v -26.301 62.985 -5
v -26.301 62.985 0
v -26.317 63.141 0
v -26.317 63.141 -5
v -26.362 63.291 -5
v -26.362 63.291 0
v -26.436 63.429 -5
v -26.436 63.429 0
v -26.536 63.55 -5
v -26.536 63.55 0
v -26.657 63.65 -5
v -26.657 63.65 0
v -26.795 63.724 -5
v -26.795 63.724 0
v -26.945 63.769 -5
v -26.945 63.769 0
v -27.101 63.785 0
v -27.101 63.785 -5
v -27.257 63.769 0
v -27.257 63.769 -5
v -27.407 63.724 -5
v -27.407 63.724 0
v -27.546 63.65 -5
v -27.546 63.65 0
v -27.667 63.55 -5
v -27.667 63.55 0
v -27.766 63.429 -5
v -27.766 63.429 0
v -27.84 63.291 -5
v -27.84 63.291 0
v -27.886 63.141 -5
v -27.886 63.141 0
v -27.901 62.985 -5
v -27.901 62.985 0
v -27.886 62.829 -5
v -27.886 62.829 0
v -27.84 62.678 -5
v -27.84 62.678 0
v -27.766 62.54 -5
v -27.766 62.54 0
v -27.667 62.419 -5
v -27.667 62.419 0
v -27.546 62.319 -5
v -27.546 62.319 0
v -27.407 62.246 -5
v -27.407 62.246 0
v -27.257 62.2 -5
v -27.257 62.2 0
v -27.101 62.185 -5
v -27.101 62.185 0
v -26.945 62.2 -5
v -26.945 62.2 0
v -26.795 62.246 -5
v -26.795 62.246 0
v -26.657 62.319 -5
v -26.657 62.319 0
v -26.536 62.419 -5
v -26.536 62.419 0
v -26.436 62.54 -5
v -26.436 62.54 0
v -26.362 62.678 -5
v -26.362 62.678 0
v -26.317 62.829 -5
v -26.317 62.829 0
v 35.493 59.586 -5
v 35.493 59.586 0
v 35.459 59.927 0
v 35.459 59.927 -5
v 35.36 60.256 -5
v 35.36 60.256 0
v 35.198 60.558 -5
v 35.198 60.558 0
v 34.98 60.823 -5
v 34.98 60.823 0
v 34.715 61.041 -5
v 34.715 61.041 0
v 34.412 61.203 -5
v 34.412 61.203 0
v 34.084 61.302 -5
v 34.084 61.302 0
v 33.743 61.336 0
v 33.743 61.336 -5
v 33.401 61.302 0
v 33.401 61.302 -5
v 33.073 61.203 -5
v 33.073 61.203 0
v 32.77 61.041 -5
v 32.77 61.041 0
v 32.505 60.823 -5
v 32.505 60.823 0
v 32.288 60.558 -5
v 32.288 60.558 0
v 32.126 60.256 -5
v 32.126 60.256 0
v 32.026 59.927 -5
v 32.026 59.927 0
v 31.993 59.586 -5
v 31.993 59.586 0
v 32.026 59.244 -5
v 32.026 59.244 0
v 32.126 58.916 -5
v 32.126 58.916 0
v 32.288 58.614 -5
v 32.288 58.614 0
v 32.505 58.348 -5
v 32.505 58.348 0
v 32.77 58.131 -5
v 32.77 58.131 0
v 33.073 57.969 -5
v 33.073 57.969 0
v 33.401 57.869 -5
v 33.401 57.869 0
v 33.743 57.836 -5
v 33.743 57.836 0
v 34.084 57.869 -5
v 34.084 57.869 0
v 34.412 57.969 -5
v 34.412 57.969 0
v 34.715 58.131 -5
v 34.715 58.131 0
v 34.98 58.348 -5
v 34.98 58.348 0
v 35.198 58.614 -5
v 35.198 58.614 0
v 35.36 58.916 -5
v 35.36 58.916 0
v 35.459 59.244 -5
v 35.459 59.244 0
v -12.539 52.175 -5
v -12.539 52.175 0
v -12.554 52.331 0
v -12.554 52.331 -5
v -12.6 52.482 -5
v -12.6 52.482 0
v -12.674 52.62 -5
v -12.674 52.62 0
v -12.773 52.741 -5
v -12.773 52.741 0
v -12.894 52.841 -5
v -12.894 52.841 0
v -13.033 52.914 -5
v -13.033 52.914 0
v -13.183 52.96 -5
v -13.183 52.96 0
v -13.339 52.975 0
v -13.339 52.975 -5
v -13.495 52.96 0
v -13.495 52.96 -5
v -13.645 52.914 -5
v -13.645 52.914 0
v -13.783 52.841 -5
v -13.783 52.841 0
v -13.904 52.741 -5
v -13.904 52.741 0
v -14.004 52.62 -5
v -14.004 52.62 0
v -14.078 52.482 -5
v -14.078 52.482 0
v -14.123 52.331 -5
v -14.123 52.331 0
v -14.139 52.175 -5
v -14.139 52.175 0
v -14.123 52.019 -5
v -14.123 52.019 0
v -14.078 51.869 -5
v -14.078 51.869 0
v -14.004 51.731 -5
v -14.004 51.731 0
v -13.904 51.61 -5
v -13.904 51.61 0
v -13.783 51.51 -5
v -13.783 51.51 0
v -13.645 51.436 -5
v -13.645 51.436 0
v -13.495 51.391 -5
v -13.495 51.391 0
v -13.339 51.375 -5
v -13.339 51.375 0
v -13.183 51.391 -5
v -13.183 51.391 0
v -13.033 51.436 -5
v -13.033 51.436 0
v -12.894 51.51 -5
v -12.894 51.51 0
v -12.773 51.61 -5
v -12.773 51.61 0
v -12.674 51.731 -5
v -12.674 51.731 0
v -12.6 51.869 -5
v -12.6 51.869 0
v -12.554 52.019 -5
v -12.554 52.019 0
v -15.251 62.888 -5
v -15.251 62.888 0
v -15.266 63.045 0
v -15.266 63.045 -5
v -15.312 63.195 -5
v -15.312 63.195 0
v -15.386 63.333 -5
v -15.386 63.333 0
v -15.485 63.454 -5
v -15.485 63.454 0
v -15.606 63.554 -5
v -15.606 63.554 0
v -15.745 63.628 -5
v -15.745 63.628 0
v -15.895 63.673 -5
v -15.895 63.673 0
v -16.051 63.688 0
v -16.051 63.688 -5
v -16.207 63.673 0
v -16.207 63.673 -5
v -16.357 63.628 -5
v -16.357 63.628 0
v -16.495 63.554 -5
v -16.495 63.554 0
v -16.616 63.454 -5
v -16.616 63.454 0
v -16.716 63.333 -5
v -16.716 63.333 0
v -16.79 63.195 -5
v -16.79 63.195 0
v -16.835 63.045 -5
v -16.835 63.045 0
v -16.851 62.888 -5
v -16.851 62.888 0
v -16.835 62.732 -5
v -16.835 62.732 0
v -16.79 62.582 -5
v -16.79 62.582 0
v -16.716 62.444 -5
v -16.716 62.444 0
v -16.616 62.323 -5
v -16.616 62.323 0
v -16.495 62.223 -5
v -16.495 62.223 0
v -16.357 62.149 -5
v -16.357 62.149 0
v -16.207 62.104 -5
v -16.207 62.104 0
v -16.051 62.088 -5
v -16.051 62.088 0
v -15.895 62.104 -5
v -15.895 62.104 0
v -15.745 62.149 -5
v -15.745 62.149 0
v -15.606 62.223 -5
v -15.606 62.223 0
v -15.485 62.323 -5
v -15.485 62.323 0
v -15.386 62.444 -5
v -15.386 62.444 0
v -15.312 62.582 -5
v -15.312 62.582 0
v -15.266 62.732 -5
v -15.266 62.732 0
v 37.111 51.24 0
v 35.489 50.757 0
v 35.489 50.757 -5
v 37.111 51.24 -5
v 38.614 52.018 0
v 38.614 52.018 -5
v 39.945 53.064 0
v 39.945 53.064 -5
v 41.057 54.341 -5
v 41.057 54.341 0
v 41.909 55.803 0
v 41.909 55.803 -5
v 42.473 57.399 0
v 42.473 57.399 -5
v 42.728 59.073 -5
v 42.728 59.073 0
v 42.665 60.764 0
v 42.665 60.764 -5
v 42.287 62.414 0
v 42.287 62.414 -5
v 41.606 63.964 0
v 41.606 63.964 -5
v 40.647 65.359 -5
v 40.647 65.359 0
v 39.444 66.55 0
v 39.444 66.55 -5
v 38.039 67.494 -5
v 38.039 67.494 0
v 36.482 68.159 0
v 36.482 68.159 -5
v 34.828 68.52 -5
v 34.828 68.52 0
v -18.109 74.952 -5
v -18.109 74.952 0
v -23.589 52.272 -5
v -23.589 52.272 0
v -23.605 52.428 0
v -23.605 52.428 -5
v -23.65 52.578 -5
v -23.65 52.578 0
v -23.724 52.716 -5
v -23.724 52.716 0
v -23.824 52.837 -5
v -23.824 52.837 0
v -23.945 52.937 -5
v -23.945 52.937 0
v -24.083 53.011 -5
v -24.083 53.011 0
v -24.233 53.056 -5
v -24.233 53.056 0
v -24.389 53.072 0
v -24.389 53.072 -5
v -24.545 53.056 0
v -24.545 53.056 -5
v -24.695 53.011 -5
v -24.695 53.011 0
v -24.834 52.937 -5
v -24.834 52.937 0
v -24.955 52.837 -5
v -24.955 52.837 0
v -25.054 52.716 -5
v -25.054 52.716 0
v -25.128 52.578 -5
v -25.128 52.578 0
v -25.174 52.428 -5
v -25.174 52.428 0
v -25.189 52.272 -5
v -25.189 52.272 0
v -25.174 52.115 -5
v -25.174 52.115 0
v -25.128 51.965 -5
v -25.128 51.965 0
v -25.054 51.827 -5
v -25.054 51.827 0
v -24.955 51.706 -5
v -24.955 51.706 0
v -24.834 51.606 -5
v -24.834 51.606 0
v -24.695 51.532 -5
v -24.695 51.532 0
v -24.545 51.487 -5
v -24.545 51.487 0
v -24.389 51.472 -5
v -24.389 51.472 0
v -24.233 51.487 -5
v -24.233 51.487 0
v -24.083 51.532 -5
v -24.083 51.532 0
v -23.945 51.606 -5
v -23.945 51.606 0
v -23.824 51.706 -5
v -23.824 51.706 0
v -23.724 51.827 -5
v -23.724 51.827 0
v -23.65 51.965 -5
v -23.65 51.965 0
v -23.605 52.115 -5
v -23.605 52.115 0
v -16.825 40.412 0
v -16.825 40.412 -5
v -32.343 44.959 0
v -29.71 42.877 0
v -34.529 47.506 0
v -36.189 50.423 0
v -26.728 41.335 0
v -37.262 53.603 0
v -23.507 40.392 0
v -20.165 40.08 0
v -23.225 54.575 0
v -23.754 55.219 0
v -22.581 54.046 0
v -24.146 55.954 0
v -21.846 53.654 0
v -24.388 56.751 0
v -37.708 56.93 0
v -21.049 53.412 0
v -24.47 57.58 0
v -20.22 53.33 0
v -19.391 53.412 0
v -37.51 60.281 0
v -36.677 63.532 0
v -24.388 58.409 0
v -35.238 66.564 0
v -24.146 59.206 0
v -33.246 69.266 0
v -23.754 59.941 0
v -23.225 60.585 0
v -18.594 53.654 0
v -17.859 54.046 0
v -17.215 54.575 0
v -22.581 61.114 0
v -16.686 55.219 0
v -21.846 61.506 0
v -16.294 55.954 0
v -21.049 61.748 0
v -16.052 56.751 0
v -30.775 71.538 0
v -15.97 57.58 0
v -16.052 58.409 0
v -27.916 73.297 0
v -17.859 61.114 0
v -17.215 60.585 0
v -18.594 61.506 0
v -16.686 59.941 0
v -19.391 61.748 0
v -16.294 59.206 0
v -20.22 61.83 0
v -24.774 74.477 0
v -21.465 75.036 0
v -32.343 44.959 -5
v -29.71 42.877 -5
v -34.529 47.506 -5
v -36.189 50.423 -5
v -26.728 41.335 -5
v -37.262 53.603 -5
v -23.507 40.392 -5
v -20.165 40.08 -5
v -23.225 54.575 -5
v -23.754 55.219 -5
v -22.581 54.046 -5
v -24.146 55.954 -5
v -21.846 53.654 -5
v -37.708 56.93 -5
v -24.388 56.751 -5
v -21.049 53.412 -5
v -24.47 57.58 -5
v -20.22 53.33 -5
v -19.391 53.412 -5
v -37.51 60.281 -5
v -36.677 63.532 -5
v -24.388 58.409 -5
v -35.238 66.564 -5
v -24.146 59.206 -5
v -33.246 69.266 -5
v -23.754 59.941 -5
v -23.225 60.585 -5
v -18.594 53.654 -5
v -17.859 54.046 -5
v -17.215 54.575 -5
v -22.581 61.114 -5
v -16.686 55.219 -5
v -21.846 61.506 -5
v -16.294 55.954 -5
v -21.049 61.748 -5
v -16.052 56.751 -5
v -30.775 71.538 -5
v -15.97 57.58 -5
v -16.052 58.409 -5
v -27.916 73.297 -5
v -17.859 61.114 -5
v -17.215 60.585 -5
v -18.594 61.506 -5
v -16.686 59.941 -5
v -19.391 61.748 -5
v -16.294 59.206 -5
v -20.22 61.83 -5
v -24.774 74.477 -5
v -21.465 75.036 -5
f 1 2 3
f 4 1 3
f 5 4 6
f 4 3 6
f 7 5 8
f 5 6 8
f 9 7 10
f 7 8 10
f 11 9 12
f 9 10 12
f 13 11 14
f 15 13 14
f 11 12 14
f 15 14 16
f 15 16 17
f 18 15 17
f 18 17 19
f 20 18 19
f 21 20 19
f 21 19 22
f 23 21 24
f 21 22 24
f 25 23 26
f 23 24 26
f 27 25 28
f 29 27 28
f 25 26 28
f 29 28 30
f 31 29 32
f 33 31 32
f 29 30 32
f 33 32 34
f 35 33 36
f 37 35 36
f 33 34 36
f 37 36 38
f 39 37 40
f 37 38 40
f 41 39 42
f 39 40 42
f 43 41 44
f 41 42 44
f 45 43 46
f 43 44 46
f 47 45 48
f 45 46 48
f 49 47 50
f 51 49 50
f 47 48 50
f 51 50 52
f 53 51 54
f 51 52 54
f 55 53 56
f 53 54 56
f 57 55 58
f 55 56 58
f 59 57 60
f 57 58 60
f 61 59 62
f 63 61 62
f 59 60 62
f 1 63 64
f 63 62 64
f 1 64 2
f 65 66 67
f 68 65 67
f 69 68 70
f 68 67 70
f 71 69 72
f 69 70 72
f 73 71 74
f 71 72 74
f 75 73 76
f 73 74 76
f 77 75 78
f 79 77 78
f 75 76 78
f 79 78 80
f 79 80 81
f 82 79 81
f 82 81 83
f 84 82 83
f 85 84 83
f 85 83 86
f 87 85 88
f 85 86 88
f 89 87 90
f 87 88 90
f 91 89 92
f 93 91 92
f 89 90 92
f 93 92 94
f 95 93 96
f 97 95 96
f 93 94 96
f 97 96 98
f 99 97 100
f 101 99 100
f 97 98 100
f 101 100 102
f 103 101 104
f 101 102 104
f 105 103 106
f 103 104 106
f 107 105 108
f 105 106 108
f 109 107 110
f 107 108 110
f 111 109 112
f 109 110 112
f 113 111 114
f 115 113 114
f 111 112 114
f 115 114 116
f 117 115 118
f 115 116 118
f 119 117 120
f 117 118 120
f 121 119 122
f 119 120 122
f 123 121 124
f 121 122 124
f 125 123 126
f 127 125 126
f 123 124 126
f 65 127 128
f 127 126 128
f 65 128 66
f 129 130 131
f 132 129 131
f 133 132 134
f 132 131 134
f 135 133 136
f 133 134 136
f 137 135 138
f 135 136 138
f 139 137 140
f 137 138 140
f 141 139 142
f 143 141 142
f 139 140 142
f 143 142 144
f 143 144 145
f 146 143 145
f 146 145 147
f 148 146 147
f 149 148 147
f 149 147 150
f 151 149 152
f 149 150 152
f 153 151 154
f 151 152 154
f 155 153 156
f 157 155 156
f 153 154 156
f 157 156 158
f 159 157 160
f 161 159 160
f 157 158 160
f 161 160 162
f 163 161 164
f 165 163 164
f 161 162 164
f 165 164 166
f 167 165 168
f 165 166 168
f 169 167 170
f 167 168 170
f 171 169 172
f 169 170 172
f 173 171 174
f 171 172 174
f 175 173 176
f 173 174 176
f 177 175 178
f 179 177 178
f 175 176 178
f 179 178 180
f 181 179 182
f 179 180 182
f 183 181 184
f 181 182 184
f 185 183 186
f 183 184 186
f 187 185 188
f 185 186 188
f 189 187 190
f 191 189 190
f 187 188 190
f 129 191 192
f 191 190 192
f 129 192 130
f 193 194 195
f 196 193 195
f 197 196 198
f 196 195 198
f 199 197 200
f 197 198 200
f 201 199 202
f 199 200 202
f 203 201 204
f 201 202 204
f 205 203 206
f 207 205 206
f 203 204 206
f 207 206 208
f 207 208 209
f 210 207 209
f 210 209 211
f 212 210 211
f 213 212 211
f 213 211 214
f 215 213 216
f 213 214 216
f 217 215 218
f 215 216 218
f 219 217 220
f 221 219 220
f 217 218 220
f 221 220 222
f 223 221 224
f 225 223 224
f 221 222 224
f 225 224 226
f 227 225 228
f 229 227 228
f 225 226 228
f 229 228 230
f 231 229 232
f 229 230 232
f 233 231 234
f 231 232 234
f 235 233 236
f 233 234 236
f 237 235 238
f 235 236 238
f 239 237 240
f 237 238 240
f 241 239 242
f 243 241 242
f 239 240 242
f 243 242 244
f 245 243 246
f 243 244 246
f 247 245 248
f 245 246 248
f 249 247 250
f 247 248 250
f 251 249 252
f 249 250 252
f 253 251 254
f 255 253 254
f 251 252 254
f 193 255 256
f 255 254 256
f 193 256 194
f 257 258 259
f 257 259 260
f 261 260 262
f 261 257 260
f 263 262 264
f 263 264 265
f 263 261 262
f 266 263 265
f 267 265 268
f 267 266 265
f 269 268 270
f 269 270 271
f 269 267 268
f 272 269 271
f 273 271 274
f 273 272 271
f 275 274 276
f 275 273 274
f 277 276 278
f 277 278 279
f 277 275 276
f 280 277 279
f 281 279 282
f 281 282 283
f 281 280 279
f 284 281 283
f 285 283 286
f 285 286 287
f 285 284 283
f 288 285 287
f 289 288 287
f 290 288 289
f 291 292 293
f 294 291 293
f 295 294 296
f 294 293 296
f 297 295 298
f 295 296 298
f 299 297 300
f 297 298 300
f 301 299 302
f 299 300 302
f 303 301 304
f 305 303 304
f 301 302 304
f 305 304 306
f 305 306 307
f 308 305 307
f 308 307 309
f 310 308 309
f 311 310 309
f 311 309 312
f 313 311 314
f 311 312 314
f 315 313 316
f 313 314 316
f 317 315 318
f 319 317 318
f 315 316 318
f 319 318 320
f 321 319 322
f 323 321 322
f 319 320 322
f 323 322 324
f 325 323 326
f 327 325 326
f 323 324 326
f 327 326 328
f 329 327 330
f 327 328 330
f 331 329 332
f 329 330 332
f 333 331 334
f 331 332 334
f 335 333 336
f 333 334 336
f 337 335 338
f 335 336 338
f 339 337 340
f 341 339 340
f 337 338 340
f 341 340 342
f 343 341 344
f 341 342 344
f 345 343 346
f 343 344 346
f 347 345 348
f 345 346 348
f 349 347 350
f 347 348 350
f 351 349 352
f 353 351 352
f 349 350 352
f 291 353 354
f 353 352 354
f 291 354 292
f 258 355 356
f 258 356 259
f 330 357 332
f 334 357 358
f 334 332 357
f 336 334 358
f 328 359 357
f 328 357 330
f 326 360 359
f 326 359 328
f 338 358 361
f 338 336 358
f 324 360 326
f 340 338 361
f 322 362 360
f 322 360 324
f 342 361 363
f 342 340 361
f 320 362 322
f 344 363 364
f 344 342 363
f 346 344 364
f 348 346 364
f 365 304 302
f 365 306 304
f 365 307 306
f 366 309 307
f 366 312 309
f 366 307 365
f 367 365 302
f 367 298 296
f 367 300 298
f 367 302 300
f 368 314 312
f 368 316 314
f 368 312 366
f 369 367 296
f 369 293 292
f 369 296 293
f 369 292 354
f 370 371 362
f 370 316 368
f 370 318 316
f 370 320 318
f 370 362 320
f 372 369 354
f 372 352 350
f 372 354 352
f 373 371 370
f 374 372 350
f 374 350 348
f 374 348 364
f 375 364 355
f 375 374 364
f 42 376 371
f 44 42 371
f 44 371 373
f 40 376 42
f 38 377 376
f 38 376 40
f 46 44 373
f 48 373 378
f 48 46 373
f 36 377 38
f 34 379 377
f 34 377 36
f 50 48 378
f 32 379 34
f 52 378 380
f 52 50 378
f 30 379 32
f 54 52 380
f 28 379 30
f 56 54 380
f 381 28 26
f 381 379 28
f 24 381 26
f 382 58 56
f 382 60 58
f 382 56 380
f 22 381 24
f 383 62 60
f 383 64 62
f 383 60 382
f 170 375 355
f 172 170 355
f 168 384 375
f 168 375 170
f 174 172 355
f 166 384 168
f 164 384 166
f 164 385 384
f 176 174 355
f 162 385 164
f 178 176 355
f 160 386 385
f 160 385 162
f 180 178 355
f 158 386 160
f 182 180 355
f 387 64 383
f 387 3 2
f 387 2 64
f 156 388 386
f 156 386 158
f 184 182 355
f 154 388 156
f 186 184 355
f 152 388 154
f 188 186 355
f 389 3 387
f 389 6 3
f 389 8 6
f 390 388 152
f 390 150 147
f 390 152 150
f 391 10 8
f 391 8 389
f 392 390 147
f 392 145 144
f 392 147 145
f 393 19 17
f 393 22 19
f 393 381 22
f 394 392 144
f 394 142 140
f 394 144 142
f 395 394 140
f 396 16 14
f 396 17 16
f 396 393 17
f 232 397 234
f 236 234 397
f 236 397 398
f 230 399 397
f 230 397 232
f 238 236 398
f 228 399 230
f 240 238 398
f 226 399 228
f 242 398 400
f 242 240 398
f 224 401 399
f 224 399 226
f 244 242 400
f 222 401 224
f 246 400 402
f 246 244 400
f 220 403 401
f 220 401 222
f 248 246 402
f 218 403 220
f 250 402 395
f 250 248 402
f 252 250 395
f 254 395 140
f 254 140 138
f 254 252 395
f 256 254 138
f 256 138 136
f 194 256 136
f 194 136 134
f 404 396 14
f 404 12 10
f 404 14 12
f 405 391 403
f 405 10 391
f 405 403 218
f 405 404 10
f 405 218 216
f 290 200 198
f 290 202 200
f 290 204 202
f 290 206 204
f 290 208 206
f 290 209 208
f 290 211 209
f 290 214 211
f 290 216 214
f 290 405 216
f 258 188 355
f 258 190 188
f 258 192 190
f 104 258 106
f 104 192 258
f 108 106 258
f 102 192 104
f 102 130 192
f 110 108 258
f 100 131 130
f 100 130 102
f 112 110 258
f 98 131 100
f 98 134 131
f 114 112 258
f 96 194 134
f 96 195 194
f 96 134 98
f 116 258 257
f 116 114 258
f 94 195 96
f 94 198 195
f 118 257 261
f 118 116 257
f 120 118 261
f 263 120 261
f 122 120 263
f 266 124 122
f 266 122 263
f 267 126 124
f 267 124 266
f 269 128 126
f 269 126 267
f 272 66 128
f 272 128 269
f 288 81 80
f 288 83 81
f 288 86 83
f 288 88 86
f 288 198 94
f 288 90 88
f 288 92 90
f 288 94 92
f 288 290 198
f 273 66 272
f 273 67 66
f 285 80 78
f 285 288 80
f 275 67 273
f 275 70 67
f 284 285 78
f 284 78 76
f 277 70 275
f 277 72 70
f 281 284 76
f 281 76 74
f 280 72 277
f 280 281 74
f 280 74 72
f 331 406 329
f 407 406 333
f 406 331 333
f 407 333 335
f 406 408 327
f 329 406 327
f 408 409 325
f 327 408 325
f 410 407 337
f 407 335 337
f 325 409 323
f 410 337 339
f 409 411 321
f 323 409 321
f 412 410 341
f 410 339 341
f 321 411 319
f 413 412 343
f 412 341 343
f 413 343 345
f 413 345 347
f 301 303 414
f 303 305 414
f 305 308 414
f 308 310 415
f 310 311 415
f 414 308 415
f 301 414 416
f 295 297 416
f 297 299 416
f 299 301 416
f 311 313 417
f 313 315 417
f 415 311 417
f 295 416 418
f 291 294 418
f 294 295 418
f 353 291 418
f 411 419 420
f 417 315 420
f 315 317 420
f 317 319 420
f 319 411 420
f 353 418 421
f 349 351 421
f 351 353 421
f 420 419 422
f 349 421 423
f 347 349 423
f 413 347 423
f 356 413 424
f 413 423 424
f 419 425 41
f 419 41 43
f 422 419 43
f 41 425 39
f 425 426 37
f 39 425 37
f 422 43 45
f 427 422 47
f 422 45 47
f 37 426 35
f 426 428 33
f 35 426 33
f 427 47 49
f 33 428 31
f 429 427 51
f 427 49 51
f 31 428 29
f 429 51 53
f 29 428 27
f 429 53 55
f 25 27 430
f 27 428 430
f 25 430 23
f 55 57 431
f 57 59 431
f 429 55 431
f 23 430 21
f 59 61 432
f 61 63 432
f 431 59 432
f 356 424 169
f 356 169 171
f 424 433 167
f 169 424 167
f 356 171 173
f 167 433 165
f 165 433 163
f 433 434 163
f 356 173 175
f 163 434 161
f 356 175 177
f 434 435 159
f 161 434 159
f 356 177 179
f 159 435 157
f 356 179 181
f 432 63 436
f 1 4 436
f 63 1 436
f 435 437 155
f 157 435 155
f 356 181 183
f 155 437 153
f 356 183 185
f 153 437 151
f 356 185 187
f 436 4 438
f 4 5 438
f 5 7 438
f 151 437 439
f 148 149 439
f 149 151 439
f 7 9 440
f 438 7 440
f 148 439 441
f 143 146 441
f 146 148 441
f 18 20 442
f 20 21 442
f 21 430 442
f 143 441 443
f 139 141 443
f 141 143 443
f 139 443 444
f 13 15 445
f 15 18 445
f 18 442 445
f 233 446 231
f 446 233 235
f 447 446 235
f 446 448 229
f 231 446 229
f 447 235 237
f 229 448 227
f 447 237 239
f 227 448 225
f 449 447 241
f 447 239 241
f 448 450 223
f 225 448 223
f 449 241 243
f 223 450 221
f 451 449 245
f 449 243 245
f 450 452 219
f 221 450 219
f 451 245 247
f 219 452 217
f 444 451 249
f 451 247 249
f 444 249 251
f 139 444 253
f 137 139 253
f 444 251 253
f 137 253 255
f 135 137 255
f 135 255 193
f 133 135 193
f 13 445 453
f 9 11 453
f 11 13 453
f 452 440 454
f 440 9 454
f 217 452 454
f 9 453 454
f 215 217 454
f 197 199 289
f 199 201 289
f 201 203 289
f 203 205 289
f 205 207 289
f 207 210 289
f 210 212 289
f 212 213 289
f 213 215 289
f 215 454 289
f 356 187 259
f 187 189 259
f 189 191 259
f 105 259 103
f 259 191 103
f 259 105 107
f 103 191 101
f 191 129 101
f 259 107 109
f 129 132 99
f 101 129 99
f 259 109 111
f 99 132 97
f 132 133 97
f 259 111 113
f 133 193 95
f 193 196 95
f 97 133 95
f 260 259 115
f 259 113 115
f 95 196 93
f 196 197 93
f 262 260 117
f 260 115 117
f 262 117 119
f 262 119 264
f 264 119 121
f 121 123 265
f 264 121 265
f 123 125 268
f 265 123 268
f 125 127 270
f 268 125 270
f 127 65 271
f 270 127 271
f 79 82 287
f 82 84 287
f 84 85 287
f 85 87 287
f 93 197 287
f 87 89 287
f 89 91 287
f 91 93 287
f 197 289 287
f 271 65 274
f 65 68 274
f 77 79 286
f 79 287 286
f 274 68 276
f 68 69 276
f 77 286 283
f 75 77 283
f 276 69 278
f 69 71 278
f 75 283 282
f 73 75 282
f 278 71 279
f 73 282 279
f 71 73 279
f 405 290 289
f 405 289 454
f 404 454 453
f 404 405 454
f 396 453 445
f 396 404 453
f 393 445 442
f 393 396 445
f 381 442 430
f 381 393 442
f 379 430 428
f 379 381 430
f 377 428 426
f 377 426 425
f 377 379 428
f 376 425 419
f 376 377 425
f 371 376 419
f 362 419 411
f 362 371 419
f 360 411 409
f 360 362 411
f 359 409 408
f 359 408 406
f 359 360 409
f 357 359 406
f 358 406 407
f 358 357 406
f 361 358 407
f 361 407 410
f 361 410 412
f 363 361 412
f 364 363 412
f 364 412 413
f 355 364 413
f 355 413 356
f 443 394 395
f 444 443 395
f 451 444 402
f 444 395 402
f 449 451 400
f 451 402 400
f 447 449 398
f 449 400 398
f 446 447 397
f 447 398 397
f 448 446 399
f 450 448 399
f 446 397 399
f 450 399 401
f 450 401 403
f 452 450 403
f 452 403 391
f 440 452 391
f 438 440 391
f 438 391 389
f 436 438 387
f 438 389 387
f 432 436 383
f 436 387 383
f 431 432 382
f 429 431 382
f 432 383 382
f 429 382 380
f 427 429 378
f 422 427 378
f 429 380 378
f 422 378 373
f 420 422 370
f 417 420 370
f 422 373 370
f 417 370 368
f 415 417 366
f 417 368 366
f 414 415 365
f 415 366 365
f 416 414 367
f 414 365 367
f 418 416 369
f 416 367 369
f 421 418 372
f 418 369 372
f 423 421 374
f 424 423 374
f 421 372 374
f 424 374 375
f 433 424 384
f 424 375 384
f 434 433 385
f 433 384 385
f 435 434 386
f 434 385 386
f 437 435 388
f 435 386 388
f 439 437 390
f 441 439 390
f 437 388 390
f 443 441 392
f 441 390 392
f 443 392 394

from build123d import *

# Parameters (mm, degrees)
SKETCH1_R           = 1.75
SKETCH1_R_2         = 4.25
SKETCH1_R_3         = 0.8
BOSS_EXTRUDE1_DEPTH = 5


with BuildPart() as part:
    # Sketch1 → Boss-Extrude1 (new body)
    with BuildSketch(Plane.XY):
        with BuildLine():
            Line((34.828288655, 68.520105857), (-18.109200177, 74.952234287))
            ThreePointArc((-18.109200177, 74.952234287), (-37.707923205, 56.929967705), (-16.825342518, 40.41240551))
            Line((-16.825342518, 40.41240551), (35.488558309, 50.756765343))
            ThreePointArc((35.488558309, 50.756765343), (42.736523537, 59.920116261), (34.828288655, 68.520105857))
        make_face()
        with Locations((33.74273446, 59.585813938)):
            Circle(SKETCH1_R, mode=Mode.SUBTRACT)
        with Locations((-20.22, 57.58)):
            Circle(SKETCH1_R_2, mode=Mode.SUBTRACT)
        with Locations((-27.101304543, 62.984641319)):
            Circle(SKETCH1_R_3, mode=Mode.SUBTRACT)
        with Locations((-16.050705268, 62.888434933)):
            Circle(SKETCH1_R_3, mode=Mode.SUBTRACT)
        with Locations((-13.338695457, 52.175358681)):
            Circle(SKETCH1_R_3, mode=Mode.SUBTRACT)
        with Locations((-24.389294732, 52.271565067)):
            Circle(SKETCH1_R_3, mode=Mode.SUBTRACT)
    extrude(amount=-BOSS_EXTRUDE1_DEPTH)


solid = part.part
